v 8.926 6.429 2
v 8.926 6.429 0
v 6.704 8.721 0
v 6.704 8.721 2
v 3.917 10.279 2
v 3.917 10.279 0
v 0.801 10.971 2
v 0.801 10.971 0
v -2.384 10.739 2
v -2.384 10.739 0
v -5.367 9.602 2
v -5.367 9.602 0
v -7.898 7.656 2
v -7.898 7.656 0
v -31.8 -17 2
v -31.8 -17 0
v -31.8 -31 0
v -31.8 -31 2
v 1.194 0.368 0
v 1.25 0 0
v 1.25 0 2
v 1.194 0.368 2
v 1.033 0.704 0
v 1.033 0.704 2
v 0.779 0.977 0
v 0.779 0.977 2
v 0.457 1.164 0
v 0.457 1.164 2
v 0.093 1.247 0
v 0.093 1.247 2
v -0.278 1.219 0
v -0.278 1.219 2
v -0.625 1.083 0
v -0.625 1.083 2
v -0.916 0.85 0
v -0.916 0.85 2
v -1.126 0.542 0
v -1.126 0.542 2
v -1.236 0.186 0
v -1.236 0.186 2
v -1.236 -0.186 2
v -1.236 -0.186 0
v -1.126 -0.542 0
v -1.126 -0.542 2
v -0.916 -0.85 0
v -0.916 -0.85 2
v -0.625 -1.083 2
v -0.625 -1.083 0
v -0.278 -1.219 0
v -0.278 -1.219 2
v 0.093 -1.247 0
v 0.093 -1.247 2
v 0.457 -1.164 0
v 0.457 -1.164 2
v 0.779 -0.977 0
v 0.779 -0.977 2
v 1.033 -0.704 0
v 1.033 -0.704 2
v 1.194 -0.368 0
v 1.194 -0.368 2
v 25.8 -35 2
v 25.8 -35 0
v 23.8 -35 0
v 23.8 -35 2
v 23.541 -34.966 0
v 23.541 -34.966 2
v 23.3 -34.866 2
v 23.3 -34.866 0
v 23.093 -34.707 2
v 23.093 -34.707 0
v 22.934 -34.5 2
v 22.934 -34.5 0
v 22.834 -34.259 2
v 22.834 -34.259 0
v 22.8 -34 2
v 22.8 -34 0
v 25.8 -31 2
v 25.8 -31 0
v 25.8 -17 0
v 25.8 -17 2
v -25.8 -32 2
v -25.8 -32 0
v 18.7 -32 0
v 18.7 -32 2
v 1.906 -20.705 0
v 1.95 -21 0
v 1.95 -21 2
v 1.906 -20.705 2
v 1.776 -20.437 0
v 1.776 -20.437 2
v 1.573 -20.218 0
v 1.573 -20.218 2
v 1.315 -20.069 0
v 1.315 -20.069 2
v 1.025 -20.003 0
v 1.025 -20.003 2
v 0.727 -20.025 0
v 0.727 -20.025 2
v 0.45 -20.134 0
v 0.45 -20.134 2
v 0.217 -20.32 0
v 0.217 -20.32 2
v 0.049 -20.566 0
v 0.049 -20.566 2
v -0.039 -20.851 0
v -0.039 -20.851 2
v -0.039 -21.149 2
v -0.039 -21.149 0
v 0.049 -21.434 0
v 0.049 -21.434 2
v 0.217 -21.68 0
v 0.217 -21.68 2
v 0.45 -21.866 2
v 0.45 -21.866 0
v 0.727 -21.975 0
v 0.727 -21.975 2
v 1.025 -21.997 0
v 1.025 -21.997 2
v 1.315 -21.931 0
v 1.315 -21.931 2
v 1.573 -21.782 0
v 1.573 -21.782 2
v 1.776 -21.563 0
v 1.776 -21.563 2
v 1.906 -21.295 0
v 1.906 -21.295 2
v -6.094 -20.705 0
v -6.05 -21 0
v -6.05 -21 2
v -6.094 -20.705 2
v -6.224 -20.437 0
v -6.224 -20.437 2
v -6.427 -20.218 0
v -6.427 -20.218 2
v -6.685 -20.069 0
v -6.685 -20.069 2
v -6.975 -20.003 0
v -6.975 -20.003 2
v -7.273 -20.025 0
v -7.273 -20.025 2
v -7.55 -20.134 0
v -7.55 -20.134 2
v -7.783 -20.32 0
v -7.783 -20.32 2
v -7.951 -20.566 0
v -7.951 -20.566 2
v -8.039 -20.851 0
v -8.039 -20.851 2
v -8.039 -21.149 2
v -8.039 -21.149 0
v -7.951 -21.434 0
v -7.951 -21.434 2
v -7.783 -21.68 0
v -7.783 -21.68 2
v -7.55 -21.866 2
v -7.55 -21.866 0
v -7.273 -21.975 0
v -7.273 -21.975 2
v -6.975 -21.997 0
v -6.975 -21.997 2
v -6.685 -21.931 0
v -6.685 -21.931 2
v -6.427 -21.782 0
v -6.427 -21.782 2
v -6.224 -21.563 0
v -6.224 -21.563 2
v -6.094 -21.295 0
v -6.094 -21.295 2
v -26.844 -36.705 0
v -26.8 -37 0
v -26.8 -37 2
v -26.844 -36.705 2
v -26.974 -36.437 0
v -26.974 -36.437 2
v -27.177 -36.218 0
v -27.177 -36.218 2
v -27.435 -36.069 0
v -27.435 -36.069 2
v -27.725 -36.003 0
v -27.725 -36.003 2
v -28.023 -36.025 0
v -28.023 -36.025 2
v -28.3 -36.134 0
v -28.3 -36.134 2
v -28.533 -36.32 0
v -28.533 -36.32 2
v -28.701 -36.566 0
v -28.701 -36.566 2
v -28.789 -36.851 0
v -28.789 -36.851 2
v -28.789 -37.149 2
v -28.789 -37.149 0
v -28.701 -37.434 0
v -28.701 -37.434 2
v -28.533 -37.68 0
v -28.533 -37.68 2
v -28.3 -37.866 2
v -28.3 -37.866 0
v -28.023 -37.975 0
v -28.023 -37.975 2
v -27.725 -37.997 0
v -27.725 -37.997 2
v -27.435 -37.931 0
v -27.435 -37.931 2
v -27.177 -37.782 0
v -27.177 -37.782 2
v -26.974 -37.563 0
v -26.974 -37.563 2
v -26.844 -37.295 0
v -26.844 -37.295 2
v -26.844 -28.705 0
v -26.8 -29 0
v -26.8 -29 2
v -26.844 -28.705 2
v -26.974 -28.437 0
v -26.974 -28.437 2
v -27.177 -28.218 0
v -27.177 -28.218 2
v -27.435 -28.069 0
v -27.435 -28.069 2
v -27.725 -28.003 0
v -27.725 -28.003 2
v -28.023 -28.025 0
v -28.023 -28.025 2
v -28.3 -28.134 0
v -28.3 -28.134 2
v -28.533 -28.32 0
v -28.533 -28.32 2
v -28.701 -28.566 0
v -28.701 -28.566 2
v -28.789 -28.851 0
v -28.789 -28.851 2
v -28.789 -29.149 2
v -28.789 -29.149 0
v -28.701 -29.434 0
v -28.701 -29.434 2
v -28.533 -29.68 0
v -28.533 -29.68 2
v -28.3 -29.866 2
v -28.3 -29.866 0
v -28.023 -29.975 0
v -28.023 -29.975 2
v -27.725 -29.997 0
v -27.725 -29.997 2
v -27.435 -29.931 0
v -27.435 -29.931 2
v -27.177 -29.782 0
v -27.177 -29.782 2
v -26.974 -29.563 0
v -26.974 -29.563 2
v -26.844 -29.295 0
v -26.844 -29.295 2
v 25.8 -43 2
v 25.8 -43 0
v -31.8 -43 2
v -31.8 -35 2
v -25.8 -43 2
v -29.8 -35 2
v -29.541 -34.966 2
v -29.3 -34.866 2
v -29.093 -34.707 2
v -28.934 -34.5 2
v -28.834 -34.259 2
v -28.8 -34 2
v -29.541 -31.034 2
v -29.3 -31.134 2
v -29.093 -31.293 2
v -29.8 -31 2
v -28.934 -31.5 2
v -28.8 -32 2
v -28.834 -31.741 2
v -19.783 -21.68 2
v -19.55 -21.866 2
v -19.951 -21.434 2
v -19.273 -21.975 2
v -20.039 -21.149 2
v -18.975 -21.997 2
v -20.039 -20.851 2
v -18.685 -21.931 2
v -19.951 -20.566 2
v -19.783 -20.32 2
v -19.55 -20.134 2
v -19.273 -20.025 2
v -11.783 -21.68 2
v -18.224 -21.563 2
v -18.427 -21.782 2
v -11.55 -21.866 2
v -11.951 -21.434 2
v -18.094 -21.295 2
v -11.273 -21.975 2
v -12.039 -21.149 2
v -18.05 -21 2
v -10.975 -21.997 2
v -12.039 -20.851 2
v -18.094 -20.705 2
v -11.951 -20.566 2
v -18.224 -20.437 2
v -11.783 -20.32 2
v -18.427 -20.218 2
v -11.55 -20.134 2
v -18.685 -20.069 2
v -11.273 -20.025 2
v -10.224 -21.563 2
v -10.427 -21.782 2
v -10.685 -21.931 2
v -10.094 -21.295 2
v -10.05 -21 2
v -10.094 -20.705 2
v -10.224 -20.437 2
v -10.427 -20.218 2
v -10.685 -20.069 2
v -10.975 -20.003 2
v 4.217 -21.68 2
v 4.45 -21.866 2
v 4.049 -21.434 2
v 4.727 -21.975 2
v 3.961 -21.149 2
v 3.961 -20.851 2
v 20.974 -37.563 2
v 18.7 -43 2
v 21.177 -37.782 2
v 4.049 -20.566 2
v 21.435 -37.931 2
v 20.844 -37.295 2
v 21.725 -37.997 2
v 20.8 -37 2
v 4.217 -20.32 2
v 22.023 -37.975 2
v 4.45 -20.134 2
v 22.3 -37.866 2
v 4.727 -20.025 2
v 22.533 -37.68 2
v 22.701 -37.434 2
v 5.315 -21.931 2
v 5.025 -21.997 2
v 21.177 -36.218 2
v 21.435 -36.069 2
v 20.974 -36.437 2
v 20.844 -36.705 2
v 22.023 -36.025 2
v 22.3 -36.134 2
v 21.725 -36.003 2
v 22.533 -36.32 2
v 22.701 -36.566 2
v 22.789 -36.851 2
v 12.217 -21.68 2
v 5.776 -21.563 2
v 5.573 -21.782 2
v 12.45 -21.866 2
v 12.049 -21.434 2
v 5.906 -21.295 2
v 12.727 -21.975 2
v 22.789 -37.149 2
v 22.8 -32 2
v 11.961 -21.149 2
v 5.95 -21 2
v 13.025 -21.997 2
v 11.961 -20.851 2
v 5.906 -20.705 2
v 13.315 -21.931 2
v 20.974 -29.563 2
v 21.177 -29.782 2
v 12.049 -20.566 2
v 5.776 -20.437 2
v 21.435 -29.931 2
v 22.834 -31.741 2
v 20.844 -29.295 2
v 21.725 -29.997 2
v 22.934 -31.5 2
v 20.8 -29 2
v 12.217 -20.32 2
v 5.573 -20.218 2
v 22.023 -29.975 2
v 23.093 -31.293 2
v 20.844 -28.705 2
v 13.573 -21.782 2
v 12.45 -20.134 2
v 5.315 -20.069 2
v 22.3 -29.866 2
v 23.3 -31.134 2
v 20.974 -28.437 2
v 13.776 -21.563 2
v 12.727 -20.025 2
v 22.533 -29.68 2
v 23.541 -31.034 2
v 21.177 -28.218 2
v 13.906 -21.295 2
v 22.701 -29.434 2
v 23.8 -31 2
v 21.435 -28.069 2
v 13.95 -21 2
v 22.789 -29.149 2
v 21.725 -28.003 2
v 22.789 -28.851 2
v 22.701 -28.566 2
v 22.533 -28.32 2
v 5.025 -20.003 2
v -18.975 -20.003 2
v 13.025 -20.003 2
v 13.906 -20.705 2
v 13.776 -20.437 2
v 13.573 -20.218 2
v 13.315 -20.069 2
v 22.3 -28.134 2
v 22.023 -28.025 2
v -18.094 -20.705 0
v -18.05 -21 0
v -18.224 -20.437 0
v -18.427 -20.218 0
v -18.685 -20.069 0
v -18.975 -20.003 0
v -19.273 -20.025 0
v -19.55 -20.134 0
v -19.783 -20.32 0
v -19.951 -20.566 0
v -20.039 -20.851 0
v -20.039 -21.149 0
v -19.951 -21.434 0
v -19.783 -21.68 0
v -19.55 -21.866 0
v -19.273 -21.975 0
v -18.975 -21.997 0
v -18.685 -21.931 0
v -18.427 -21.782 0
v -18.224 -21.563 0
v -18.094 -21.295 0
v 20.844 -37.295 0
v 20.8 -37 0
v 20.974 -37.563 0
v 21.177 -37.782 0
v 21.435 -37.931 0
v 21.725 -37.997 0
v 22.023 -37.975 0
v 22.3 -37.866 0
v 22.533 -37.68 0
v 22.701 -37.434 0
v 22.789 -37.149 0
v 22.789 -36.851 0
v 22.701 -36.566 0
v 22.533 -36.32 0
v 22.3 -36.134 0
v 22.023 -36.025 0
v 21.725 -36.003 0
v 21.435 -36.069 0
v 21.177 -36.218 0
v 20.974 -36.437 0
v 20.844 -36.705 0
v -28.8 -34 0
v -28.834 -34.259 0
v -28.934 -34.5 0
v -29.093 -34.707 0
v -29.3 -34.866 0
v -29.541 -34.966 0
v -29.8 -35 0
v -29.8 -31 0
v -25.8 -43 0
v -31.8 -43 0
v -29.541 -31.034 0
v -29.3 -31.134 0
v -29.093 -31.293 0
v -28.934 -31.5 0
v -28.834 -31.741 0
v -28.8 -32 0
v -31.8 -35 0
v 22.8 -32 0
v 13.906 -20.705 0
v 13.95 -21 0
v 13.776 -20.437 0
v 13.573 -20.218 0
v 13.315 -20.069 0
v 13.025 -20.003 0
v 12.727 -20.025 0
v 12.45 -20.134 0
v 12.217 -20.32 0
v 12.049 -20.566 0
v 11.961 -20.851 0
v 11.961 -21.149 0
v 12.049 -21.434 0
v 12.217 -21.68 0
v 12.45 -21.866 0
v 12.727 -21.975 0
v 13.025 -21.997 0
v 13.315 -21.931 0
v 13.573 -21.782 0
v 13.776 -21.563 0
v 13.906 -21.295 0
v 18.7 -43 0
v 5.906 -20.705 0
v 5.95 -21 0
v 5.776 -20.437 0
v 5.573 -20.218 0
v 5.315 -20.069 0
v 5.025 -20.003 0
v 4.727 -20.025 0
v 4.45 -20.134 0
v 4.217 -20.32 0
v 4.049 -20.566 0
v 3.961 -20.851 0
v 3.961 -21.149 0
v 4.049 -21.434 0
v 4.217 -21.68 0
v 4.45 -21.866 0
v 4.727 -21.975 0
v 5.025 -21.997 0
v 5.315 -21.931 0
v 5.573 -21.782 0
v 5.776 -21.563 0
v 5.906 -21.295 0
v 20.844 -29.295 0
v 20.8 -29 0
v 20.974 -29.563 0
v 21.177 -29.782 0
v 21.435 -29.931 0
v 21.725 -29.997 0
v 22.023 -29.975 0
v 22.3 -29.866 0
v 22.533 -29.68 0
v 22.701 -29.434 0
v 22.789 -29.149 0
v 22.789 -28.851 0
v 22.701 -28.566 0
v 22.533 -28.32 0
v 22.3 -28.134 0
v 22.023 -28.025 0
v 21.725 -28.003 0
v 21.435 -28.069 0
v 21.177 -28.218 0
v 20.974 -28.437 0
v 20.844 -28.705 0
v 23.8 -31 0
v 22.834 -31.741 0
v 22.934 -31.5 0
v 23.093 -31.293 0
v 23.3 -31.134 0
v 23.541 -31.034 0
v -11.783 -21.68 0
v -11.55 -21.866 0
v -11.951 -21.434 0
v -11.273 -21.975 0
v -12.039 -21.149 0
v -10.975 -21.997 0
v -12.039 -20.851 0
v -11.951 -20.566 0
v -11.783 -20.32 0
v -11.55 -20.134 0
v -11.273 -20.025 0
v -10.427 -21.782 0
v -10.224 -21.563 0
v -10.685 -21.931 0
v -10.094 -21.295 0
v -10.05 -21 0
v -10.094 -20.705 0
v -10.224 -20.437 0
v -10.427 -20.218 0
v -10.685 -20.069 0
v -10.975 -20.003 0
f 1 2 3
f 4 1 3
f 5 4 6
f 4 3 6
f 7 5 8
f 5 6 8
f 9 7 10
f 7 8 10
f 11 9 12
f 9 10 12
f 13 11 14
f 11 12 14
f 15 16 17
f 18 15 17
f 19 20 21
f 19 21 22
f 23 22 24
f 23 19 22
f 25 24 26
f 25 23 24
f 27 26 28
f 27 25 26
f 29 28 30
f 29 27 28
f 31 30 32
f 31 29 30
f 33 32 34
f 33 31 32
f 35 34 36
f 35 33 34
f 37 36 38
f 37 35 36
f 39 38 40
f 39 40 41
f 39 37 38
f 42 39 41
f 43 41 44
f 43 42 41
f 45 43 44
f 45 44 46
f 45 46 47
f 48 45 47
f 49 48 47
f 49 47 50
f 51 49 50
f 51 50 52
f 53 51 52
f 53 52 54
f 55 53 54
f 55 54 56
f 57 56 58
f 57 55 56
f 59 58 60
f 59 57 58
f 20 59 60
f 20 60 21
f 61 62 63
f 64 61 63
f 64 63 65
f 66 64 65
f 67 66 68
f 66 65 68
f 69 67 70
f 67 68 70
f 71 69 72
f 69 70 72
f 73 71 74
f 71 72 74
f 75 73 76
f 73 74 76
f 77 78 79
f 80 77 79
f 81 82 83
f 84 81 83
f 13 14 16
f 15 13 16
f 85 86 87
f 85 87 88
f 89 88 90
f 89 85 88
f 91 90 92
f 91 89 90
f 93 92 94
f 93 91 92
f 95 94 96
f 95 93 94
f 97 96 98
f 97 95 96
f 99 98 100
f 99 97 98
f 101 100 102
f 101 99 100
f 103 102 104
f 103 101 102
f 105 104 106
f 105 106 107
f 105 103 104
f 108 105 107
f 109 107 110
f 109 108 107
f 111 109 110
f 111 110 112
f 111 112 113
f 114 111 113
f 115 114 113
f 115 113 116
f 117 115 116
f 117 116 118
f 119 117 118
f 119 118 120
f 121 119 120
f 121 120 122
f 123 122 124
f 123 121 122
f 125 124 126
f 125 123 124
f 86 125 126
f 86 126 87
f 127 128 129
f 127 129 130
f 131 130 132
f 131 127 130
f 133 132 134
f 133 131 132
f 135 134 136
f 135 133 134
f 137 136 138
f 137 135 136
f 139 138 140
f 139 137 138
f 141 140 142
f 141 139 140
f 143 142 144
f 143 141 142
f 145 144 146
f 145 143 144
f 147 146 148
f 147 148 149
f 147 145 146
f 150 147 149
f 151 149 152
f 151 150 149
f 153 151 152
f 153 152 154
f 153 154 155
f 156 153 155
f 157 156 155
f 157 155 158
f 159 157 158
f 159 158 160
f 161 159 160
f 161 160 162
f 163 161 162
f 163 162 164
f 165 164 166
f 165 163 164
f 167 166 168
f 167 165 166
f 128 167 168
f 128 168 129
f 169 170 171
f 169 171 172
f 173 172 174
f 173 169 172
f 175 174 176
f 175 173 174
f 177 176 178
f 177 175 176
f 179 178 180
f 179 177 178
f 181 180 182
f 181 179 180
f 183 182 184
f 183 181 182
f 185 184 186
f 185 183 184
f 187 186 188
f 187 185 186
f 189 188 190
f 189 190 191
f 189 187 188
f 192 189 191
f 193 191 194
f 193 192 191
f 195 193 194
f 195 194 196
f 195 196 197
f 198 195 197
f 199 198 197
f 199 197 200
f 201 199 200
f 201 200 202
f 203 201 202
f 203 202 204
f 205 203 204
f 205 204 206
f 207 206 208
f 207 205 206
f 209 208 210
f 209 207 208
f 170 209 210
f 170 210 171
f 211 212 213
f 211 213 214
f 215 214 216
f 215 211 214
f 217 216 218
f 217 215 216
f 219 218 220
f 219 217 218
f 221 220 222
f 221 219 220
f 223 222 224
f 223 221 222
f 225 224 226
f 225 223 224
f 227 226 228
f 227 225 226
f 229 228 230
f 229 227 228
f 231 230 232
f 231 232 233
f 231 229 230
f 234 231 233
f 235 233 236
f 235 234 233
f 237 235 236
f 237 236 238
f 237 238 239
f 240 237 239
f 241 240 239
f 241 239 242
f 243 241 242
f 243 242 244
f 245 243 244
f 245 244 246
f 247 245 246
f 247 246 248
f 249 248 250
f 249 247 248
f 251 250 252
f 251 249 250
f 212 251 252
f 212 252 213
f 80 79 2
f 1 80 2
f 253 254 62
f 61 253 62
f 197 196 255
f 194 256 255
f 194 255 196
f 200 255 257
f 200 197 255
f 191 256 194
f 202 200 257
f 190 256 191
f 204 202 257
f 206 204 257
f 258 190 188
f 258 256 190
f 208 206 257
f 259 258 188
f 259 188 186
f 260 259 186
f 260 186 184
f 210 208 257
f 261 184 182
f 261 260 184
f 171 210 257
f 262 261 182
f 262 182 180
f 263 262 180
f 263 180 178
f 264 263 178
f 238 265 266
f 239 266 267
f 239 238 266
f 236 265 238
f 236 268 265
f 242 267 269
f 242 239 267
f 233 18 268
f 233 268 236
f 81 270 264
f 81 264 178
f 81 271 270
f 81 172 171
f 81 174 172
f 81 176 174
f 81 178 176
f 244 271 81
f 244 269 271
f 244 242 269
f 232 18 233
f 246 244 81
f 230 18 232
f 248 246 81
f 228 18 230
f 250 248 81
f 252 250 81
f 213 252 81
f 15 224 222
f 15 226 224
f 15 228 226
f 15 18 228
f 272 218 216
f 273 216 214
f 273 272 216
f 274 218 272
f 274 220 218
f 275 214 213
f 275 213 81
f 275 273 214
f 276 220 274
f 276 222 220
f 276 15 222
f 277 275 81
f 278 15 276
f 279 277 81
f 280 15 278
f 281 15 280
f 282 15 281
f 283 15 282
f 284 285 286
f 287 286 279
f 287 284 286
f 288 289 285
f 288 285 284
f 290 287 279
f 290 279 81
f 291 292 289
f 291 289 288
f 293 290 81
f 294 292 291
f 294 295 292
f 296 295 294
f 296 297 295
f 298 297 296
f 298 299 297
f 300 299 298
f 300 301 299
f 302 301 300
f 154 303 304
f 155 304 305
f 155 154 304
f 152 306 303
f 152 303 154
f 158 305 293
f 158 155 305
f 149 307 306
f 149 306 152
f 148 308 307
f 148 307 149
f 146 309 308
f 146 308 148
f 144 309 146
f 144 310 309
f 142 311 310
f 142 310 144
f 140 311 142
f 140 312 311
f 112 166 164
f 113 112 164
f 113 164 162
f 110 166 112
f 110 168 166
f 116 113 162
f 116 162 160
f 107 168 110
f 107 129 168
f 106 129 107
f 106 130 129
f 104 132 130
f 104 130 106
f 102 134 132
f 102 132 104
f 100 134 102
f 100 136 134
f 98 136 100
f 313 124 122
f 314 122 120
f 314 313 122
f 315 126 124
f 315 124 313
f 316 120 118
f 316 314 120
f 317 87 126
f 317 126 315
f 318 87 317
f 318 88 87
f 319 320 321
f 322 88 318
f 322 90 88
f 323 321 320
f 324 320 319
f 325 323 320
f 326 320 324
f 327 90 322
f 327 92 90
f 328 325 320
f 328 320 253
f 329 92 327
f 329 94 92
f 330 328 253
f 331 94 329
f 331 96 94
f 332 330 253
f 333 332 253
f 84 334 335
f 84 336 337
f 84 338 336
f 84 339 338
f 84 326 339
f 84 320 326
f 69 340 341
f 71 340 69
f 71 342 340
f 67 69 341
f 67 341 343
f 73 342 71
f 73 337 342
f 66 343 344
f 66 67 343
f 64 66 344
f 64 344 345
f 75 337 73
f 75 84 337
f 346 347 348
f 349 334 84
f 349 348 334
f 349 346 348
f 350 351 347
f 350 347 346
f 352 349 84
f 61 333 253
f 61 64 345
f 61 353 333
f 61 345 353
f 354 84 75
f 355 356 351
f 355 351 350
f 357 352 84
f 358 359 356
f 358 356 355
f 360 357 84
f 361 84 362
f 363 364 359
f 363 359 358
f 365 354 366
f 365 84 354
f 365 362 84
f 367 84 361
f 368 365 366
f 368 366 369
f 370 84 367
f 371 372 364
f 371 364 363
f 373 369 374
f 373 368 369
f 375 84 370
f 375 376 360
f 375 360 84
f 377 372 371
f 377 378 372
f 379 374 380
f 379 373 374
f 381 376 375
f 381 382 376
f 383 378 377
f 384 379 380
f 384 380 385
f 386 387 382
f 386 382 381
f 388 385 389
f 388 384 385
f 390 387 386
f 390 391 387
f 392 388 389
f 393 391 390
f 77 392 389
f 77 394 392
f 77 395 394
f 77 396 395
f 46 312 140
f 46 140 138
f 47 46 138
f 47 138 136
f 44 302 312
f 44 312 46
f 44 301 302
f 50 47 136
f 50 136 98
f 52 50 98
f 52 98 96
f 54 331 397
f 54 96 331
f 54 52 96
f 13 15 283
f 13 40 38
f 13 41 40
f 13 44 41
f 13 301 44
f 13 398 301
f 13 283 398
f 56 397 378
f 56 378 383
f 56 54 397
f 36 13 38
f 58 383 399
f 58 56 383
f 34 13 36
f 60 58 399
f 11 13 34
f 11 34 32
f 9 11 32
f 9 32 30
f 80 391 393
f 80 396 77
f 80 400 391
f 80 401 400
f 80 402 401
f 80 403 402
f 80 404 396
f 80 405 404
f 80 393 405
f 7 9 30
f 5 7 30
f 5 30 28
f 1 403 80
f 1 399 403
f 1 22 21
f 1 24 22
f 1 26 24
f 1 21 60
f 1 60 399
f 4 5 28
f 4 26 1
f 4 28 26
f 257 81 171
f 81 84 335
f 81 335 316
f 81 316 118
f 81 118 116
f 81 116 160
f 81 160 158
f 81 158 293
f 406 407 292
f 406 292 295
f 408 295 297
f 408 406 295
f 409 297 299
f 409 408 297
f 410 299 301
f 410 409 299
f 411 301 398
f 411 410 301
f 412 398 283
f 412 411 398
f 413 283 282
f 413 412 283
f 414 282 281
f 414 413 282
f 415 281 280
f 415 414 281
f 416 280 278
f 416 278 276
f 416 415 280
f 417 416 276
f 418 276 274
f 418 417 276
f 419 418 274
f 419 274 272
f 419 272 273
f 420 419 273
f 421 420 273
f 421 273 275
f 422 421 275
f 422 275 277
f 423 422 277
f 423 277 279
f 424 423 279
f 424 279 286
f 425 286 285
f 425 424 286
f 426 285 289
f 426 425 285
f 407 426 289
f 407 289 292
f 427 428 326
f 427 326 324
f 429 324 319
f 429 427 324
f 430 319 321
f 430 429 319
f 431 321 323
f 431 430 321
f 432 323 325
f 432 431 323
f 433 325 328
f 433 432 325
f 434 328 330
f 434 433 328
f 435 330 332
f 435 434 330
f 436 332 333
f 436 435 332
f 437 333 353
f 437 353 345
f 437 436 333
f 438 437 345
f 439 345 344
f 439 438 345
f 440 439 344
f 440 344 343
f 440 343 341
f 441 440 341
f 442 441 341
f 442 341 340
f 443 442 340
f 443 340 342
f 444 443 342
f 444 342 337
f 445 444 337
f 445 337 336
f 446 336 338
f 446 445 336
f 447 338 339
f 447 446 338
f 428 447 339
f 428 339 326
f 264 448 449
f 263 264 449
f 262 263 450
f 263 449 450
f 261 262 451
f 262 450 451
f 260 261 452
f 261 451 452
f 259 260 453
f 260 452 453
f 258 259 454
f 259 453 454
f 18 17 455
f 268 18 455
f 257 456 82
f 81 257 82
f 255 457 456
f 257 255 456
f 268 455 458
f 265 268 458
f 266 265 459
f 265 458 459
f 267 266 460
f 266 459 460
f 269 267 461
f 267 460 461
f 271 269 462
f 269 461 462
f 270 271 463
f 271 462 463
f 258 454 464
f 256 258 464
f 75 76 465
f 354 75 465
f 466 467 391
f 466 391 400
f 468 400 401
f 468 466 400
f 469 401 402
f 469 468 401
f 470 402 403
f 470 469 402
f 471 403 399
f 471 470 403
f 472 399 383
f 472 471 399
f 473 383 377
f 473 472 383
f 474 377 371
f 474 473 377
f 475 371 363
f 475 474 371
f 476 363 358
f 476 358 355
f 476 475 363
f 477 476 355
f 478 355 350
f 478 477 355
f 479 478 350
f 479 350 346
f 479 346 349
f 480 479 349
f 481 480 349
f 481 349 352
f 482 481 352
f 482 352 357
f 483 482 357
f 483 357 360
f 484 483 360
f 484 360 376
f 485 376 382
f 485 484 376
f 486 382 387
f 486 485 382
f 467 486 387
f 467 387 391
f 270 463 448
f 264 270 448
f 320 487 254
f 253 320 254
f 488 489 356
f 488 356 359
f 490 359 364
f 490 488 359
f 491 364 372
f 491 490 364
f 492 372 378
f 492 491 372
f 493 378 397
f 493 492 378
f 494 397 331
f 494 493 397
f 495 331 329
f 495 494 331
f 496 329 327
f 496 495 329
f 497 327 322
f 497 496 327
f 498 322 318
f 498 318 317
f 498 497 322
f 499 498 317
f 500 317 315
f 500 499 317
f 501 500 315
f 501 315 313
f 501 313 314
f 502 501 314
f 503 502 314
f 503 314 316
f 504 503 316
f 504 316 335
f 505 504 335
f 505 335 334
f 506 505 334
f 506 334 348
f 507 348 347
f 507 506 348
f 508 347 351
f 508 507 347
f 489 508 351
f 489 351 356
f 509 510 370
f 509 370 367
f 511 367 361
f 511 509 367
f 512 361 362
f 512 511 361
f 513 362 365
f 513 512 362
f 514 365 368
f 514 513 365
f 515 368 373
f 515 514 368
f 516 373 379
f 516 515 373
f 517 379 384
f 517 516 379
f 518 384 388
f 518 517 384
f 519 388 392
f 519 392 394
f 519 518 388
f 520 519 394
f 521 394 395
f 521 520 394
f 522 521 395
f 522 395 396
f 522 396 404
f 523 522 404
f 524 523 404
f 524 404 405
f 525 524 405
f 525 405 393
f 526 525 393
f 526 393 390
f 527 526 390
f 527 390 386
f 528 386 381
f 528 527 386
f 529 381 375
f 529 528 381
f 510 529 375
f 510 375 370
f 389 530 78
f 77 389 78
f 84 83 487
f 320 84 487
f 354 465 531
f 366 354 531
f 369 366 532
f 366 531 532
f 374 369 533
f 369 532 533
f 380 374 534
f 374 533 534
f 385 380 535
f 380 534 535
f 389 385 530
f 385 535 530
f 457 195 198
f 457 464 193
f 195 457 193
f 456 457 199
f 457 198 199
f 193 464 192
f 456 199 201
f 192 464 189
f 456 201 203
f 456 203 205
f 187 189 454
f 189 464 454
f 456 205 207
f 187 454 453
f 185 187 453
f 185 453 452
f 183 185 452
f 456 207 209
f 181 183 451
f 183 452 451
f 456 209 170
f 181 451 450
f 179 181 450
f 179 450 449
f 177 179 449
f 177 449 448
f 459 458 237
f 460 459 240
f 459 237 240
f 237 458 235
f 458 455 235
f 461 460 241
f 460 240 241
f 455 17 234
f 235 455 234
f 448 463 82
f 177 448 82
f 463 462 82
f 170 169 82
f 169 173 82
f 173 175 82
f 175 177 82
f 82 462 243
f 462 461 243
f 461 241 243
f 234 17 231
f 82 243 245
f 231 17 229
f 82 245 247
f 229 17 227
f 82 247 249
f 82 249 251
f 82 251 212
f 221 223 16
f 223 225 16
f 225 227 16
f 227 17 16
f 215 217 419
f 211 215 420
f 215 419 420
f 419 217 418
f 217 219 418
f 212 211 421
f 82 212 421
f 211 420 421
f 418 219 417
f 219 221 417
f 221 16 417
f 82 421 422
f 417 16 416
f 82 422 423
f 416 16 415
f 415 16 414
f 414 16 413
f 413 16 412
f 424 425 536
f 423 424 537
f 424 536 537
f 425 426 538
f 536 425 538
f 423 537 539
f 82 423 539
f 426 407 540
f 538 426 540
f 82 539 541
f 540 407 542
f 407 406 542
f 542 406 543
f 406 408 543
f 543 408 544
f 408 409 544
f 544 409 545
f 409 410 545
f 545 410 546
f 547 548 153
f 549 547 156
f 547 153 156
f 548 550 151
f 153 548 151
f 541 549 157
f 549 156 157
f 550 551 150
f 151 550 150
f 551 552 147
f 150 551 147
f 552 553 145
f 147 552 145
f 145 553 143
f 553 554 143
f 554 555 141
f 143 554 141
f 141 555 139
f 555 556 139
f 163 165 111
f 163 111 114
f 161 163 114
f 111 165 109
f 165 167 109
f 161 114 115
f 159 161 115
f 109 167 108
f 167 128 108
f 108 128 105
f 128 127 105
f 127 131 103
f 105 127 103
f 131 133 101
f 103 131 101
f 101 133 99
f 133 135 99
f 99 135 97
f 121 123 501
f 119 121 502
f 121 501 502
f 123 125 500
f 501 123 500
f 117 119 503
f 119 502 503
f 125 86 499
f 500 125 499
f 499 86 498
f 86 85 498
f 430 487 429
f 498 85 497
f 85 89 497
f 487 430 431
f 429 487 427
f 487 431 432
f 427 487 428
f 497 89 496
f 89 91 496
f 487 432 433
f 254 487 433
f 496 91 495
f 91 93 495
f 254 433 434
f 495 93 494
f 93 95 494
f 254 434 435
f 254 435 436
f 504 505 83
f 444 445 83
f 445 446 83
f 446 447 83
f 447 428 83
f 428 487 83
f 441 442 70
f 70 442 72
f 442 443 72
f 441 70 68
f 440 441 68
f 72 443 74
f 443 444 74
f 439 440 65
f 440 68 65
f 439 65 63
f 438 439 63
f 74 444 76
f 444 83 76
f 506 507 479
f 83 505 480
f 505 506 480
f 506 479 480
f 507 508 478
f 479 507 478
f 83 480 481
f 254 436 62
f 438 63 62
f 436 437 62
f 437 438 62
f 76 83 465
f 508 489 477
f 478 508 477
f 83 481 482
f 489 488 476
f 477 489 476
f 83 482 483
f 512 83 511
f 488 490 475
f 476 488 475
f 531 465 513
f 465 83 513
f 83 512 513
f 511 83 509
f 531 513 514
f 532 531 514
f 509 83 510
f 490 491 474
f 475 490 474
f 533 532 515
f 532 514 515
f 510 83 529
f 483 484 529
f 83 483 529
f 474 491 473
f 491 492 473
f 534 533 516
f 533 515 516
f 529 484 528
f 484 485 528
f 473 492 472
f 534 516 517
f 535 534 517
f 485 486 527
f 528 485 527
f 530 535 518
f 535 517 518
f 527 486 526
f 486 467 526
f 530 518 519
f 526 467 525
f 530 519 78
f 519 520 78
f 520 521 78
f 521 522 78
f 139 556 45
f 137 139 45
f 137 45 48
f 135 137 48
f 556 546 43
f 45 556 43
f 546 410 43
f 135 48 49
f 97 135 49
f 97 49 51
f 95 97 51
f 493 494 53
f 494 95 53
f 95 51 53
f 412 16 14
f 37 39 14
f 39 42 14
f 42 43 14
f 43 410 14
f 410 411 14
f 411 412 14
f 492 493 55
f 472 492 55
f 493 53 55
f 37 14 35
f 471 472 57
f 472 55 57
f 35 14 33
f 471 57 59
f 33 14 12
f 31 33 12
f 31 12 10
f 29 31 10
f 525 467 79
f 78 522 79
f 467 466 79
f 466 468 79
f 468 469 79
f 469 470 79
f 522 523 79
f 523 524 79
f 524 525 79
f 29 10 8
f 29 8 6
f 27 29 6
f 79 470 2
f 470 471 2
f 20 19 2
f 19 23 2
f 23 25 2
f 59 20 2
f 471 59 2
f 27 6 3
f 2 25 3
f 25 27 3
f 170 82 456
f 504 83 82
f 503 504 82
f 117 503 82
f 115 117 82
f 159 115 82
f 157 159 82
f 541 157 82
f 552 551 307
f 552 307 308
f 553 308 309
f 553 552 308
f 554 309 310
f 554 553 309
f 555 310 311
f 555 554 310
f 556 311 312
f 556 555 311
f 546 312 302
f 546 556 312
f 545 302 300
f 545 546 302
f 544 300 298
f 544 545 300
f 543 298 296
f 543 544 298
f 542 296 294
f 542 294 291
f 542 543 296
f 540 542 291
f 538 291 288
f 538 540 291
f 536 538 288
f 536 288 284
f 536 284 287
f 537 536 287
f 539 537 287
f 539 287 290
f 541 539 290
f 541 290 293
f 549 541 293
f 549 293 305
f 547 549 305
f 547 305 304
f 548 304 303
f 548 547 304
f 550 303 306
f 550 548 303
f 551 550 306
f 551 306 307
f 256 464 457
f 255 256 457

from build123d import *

# Parameters (mm, degrees)
SKETCH_1_R      = 1.25
SKETCH_1_R_2    = 1
EXTRUDE_1_DEPTH = 2


with BuildPart() as part:
    # 草圖1 → 填料-伸長1 (new body)
    with BuildSketch(Plane.XY):
        with BuildLine():
            Line((-28.8, -32), (-28.8, -34))
            ThreePointArc((-28.8, -34), (-29.092893219, -34.707106781), (-29.8, -35))
            Line((-29.8, -35), (-31.8, -35))
            Line((-31.8, -35), (-31.8, -36))
            Line((-31.8, -36), (-31.8, -42))
            Line((-31.8, -42), (-31.8, -43))
            Line((-31.8, -43), (-30.8, -43))
            Line((-30.8, -43), (-26.8, -43))
            Line((-26.8, -43), (-25.8, -43))
            Line((-25.8, -43), (-25.8, -32))
            Line((-25.8, -32), (18.7, -32))
            Line((18.7, -32), (18.7, -43))
            Line((18.7, -43), (24.8, -43))
            Line((24.8, -43), (25.8, -43))
            Line((25.8, -43), (25.8, -42))
            Line((25.8, -42), (25.8, -36))
            Line((25.8, -36), (25.8, -35))
            Line((25.8, -35), (23.8, -35))
            ThreePointArc((23.8, -35), (23.092893219, -34.707106781), (22.8, -34))
            Line((22.8, -34), (22.8, -32))
            ThreePointArc((22.8, -32), (23.092893219, -31.292893219), (23.8, -31))
            Line((23.8, -31), (25.8, -31))
            Line((25.8, -31), (25.8, -18))
            Line((25.8, -18), (25.8, -17))
            Line((25.8, -17), (8.925896882, 6.428714091))
            ThreePointArc((8.925896882, 6.428714091), (0.800566406, 10.970829204), (-7.898074186, 7.656397596))
            Line((-7.898074186, 7.656397596), (-31.8, -17))
            Line((-31.8, -17), (-31.8, -18))
            Line((-31.8, -18), (-31.8, -31))
            Line((-31.8, -31), (-29.8, -31))
            ThreePointArc((-29.8, -31), (-29.092893219, -31.292893219), (-28.8, -32))
        make_face()
        Circle(SKETCH_1_R, mode=Mode.SUBTRACT)
        with Locations((-19.05, -21)):
            Circle(SKETCH_1_R_2, mode=Mode.SUBTRACT)
        with Locations((-11.05, -21)):
            Circle(SKETCH_1_R_2, mode=Mode.SUBTRACT)
        with Locations((4.95, -21)):
            Circle(SKETCH_1_R_2, mode=Mode.SUBTRACT)
        with Locations((12.95, -21)):
            Circle(SKETCH_1_R_2, mode=Mode.SUBTRACT)
        with Locations((-27.8, -29)):
            Circle(SKETCH_1_R_2, mode=Mode.SUBTRACT)
        with Locations((-27.8, -37)):
            Circle(SKETCH_1_R_2, mode=Mode.SUBTRACT)
        with Locations(Location((21.8, -37, 0), (0, 0, 180))):
            Circle(SKETCH_1_R_2, mode=Mode.SUBTRACT)
        with Locations(Location((21.8, -29, 0), (0, 0, 180))):
            Circle(SKETCH_1_R_2, mode=Mode.SUBTRACT)
        with Locations((-7.05, -21)):
            Circle(SKETCH_1_R_2, mode=Mode.SUBTRACT)
        with Locations((0.95, -21)):
            Circle(SKETCH_1_R_2, mode=Mode.SUBTRACT)
    extrude(amount=EXTRUDE_1_DEPTH)


solid = part.part
